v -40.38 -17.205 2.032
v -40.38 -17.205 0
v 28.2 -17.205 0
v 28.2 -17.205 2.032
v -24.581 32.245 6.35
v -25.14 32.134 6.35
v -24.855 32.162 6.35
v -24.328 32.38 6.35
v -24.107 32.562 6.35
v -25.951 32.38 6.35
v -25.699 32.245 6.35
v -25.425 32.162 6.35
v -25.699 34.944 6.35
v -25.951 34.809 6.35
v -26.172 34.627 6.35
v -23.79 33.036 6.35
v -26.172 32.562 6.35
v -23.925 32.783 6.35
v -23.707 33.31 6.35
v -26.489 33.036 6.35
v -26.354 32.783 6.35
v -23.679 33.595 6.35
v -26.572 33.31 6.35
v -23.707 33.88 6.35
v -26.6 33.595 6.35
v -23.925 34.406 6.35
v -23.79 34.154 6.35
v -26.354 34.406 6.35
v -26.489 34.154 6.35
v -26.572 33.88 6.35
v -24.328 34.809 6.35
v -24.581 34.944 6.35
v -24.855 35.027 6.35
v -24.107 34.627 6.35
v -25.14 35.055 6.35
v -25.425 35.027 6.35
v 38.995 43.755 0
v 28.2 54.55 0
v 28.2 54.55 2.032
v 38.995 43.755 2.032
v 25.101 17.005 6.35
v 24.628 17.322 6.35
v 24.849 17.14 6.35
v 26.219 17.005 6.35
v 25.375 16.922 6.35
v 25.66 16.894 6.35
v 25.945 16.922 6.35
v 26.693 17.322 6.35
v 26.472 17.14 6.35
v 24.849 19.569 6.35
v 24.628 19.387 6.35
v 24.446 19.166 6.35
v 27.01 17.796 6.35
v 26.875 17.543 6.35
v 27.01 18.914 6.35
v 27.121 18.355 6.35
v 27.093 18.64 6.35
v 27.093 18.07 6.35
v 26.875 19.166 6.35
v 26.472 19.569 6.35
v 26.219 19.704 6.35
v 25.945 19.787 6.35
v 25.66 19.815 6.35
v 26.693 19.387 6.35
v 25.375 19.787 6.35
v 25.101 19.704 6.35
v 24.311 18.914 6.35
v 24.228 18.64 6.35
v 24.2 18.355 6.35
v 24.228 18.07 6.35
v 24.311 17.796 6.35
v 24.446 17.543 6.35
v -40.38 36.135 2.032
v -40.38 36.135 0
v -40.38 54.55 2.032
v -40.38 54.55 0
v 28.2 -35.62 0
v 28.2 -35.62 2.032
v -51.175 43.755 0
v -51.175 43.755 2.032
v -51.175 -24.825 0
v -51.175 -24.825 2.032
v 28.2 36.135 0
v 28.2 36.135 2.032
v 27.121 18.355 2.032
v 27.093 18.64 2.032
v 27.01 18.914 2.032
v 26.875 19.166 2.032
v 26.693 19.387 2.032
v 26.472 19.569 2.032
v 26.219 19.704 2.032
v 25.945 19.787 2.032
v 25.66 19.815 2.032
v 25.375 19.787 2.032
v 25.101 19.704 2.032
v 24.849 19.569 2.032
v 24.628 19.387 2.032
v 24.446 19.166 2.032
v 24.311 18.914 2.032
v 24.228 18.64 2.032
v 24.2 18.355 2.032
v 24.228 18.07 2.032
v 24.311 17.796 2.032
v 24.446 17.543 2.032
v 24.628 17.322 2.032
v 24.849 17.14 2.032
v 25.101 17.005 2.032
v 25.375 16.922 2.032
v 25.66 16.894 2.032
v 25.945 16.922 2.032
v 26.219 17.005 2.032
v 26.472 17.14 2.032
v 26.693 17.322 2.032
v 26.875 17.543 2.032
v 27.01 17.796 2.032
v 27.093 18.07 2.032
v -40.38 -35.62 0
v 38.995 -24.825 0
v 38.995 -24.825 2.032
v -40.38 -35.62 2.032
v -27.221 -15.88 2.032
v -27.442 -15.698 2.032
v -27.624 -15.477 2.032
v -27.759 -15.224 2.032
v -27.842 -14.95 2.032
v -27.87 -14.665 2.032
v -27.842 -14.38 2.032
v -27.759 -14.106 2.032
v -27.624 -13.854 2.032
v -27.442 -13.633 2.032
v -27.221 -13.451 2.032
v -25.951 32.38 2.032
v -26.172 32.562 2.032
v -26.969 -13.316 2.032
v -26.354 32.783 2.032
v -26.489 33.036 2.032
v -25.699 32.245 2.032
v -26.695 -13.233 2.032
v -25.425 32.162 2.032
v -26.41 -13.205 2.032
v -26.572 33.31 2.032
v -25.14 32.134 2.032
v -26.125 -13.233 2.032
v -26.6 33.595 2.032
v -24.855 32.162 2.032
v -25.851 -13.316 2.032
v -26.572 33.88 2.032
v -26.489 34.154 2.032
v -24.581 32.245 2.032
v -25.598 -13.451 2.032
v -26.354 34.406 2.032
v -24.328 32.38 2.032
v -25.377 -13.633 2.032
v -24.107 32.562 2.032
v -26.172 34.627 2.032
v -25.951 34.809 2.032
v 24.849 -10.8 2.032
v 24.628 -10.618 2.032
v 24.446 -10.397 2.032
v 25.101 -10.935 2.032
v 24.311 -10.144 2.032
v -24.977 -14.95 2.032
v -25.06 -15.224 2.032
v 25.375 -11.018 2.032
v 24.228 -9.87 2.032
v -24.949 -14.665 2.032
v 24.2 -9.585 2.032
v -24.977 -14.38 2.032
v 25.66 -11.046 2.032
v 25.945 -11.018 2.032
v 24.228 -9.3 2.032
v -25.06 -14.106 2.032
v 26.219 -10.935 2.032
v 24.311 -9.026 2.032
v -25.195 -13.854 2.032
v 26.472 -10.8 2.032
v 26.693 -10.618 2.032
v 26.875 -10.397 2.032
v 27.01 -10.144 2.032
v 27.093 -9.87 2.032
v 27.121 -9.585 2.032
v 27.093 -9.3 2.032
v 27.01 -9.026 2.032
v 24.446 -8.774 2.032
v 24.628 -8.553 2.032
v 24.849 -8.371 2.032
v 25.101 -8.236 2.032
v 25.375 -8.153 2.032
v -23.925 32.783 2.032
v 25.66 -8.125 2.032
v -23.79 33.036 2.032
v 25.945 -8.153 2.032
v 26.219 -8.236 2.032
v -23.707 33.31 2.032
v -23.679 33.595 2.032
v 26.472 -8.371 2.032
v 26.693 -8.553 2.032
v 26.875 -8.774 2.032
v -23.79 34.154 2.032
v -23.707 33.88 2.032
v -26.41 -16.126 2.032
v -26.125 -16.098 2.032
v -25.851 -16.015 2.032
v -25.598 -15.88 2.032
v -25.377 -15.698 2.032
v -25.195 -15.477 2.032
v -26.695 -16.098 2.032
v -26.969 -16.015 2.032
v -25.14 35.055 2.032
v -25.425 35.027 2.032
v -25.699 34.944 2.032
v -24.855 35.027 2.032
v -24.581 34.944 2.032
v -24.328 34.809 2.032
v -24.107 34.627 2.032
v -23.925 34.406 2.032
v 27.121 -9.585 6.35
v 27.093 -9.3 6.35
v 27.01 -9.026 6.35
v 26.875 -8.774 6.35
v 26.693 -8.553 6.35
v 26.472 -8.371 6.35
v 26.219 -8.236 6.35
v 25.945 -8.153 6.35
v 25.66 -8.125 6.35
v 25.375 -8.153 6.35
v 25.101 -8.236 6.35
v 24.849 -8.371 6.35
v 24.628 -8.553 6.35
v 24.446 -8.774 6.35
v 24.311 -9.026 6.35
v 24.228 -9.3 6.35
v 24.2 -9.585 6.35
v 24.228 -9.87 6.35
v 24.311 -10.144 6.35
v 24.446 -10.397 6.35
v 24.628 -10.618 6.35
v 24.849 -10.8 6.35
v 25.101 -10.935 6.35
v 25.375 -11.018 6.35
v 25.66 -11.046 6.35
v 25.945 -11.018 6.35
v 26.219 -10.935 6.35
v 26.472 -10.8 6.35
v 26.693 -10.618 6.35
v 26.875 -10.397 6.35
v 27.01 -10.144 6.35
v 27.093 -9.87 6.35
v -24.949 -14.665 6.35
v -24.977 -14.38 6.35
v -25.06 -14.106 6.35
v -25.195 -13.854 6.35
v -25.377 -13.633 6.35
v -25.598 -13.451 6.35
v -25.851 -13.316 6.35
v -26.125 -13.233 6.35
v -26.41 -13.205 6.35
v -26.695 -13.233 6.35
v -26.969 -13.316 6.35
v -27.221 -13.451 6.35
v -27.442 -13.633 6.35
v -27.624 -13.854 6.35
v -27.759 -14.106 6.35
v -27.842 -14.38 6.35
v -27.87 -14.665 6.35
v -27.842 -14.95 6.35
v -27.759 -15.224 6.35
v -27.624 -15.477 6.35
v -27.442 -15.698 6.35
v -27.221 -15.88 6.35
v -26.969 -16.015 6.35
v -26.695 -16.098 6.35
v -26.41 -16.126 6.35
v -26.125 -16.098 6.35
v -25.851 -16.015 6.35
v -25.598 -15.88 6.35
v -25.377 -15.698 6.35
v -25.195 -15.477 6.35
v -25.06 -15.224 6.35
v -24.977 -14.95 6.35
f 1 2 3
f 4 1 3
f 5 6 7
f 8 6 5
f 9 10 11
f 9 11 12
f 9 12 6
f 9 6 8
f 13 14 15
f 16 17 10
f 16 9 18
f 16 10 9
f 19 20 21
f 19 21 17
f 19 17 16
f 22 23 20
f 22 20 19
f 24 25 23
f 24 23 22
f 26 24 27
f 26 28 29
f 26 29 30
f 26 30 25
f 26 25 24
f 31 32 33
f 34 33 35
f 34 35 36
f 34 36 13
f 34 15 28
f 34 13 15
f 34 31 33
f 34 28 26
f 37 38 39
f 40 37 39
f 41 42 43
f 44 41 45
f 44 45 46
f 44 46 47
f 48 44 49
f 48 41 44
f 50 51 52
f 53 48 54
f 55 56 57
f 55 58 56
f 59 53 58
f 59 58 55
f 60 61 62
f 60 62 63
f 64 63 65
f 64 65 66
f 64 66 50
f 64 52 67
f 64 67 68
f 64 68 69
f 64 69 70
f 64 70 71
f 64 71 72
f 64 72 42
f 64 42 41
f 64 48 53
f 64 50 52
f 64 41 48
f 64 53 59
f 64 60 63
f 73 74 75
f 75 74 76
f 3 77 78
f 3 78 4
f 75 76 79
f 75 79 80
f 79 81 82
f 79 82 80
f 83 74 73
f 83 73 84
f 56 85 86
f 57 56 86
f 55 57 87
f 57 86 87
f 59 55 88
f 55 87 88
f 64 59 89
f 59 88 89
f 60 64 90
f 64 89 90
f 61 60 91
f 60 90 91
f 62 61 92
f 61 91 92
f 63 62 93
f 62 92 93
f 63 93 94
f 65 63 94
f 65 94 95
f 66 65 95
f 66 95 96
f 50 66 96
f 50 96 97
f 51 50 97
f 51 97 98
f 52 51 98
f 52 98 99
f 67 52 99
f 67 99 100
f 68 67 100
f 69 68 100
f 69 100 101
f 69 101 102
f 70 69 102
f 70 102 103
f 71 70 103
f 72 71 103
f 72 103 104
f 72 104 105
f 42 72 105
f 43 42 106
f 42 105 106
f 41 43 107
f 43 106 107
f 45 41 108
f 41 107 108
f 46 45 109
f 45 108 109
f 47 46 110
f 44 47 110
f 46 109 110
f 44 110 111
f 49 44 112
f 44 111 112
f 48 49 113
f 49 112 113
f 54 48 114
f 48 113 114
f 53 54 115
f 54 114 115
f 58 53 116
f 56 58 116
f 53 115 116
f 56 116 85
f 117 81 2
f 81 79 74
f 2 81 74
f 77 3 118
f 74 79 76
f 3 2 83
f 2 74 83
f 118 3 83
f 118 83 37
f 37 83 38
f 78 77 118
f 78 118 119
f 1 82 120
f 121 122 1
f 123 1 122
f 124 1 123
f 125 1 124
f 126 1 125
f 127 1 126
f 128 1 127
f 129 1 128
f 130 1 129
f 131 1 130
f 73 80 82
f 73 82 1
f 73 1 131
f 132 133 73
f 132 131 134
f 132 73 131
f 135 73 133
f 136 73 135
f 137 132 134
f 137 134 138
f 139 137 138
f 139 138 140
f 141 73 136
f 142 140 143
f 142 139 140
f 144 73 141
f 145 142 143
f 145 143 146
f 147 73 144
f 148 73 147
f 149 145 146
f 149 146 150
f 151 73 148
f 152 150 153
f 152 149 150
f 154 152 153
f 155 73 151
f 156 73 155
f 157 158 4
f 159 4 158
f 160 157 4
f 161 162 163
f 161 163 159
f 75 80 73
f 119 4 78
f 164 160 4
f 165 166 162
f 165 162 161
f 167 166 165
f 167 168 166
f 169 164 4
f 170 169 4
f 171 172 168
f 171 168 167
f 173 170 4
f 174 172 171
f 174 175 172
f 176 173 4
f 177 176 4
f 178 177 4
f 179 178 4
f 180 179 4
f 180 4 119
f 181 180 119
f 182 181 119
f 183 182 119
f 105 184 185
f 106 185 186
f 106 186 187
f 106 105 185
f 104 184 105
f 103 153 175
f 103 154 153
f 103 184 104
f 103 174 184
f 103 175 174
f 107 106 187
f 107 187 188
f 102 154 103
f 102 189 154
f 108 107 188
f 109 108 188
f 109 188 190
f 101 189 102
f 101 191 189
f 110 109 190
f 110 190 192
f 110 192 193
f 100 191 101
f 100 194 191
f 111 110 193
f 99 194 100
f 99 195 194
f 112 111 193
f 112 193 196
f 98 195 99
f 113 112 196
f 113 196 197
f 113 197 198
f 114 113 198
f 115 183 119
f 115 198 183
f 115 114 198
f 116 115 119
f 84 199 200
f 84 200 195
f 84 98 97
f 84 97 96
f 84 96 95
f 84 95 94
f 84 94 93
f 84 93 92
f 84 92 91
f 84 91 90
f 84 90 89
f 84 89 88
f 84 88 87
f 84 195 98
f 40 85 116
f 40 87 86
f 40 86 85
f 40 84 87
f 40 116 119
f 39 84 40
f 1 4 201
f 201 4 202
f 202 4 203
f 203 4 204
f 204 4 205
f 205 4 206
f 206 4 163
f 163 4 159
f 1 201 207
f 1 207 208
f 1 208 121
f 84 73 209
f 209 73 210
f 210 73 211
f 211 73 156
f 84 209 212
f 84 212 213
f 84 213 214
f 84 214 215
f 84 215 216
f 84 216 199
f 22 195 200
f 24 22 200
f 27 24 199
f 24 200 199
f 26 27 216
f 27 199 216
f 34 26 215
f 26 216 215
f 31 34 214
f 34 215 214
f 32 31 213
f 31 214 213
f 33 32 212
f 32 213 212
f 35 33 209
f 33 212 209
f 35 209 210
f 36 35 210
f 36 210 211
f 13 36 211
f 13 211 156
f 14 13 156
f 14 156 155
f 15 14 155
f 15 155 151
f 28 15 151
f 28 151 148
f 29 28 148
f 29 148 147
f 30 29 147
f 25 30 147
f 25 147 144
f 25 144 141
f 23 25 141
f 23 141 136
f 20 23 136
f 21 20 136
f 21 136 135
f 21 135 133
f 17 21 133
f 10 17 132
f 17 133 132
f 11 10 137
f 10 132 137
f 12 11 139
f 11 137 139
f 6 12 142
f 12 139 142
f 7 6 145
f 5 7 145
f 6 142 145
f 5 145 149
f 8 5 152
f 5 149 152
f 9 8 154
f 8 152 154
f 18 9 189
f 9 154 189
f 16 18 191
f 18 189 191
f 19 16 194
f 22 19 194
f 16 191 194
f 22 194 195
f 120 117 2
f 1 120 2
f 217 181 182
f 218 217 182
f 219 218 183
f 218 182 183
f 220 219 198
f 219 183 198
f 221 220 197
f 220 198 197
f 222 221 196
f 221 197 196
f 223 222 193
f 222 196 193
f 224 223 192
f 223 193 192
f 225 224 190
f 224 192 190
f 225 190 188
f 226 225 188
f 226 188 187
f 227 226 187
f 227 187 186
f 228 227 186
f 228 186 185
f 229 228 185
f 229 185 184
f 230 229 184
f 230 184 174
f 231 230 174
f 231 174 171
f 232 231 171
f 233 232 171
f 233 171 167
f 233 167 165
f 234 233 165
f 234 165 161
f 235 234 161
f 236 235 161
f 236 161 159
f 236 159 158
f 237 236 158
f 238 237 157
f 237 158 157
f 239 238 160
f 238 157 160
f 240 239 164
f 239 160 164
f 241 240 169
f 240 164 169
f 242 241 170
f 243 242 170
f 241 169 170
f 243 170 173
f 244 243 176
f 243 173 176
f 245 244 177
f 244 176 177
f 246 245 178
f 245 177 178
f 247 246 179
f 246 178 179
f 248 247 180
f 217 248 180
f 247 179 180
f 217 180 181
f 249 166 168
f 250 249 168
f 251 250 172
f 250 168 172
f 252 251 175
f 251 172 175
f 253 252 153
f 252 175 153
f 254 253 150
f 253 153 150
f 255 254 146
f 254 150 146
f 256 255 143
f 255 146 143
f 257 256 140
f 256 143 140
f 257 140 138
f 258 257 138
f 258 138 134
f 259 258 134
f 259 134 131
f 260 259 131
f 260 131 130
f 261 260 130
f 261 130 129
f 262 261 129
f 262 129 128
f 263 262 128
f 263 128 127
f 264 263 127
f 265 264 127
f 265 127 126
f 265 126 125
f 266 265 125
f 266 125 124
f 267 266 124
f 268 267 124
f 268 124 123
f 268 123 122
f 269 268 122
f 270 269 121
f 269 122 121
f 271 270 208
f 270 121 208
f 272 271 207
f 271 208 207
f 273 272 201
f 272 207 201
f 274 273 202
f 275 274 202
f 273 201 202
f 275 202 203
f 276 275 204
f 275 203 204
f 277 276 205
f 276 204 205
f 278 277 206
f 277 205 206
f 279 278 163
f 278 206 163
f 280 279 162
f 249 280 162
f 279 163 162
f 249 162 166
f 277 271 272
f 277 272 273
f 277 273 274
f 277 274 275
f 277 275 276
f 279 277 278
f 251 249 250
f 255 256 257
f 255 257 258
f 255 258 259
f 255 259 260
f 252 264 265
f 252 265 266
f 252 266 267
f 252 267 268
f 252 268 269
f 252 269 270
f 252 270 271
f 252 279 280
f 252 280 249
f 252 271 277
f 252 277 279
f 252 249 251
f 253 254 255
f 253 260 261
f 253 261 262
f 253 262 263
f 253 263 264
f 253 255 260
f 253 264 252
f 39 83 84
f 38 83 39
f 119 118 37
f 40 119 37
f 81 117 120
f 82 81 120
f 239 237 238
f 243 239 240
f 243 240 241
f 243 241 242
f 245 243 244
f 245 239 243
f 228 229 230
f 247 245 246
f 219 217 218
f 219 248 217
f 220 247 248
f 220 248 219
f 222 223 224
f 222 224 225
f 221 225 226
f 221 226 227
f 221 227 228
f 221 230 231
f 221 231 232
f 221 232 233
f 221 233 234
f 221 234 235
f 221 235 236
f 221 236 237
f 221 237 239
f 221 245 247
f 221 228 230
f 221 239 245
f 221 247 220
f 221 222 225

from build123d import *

# Parameters (mm, degrees)
F0_W     = 90.17
F0_H     = 91.44
F1_DEPTH = 2.032
F2_SIZE  = 11.43
F3_W     = 68.58
F3_H     = 20.32
F4_DEPTH = 25.4
F5_R     = 1.4605
F6_DEPTH = 6.35


with BuildPart() as f1:
    # F0 (on Top) → F1 (new body)
    with BuildSketch(Plane.XY):
        with Locations((-6.089645, 9.464618)):
            Rectangle(F0_W, F0_H)
    extrude(amount=F1_DEPTH)

    # F2
    f2_edges = [f1.edges().sort_by_distance(p)[0] for p in [
        (-51.174645, 55.184618, 1.016),
        (-51.174645, -36.255382, 1.016),
        (38.995355, 55.184618, 1.016),
        (38.995355, -36.255382, 1.016),
    ]]
    chamfer(f2_edges, length=F2_SIZE)

    # F3 (on Top) → F4 (cut)
    with BuildSketch(Plane.XY):
        with Locations((-6.089645, -27.365382)):
            Rectangle(F3_W, F3_H)
        with Locations((-6.089645, 46.294618)):
            Rectangle(F3_W, F3_H)
    extrude(amount=F4_DEPTH, mode=Mode.SUBTRACT)

    # F5 (on Top) → F6 (join)
    with BuildSketch(Plane.XY):
        with Locations((-26.409645, -14.665382)):
            Circle(F5_R)
        with Locations((25.660355, -9.585382)):
            Circle(F5_R)
        with Locations((25.660355, 18.354618)):
            Circle(F5_R)
        with Locations((-25.139645, 33.594618)):
            Circle(F5_R)
    extrude(amount=F6_DEPTH)


solid = f1.part
